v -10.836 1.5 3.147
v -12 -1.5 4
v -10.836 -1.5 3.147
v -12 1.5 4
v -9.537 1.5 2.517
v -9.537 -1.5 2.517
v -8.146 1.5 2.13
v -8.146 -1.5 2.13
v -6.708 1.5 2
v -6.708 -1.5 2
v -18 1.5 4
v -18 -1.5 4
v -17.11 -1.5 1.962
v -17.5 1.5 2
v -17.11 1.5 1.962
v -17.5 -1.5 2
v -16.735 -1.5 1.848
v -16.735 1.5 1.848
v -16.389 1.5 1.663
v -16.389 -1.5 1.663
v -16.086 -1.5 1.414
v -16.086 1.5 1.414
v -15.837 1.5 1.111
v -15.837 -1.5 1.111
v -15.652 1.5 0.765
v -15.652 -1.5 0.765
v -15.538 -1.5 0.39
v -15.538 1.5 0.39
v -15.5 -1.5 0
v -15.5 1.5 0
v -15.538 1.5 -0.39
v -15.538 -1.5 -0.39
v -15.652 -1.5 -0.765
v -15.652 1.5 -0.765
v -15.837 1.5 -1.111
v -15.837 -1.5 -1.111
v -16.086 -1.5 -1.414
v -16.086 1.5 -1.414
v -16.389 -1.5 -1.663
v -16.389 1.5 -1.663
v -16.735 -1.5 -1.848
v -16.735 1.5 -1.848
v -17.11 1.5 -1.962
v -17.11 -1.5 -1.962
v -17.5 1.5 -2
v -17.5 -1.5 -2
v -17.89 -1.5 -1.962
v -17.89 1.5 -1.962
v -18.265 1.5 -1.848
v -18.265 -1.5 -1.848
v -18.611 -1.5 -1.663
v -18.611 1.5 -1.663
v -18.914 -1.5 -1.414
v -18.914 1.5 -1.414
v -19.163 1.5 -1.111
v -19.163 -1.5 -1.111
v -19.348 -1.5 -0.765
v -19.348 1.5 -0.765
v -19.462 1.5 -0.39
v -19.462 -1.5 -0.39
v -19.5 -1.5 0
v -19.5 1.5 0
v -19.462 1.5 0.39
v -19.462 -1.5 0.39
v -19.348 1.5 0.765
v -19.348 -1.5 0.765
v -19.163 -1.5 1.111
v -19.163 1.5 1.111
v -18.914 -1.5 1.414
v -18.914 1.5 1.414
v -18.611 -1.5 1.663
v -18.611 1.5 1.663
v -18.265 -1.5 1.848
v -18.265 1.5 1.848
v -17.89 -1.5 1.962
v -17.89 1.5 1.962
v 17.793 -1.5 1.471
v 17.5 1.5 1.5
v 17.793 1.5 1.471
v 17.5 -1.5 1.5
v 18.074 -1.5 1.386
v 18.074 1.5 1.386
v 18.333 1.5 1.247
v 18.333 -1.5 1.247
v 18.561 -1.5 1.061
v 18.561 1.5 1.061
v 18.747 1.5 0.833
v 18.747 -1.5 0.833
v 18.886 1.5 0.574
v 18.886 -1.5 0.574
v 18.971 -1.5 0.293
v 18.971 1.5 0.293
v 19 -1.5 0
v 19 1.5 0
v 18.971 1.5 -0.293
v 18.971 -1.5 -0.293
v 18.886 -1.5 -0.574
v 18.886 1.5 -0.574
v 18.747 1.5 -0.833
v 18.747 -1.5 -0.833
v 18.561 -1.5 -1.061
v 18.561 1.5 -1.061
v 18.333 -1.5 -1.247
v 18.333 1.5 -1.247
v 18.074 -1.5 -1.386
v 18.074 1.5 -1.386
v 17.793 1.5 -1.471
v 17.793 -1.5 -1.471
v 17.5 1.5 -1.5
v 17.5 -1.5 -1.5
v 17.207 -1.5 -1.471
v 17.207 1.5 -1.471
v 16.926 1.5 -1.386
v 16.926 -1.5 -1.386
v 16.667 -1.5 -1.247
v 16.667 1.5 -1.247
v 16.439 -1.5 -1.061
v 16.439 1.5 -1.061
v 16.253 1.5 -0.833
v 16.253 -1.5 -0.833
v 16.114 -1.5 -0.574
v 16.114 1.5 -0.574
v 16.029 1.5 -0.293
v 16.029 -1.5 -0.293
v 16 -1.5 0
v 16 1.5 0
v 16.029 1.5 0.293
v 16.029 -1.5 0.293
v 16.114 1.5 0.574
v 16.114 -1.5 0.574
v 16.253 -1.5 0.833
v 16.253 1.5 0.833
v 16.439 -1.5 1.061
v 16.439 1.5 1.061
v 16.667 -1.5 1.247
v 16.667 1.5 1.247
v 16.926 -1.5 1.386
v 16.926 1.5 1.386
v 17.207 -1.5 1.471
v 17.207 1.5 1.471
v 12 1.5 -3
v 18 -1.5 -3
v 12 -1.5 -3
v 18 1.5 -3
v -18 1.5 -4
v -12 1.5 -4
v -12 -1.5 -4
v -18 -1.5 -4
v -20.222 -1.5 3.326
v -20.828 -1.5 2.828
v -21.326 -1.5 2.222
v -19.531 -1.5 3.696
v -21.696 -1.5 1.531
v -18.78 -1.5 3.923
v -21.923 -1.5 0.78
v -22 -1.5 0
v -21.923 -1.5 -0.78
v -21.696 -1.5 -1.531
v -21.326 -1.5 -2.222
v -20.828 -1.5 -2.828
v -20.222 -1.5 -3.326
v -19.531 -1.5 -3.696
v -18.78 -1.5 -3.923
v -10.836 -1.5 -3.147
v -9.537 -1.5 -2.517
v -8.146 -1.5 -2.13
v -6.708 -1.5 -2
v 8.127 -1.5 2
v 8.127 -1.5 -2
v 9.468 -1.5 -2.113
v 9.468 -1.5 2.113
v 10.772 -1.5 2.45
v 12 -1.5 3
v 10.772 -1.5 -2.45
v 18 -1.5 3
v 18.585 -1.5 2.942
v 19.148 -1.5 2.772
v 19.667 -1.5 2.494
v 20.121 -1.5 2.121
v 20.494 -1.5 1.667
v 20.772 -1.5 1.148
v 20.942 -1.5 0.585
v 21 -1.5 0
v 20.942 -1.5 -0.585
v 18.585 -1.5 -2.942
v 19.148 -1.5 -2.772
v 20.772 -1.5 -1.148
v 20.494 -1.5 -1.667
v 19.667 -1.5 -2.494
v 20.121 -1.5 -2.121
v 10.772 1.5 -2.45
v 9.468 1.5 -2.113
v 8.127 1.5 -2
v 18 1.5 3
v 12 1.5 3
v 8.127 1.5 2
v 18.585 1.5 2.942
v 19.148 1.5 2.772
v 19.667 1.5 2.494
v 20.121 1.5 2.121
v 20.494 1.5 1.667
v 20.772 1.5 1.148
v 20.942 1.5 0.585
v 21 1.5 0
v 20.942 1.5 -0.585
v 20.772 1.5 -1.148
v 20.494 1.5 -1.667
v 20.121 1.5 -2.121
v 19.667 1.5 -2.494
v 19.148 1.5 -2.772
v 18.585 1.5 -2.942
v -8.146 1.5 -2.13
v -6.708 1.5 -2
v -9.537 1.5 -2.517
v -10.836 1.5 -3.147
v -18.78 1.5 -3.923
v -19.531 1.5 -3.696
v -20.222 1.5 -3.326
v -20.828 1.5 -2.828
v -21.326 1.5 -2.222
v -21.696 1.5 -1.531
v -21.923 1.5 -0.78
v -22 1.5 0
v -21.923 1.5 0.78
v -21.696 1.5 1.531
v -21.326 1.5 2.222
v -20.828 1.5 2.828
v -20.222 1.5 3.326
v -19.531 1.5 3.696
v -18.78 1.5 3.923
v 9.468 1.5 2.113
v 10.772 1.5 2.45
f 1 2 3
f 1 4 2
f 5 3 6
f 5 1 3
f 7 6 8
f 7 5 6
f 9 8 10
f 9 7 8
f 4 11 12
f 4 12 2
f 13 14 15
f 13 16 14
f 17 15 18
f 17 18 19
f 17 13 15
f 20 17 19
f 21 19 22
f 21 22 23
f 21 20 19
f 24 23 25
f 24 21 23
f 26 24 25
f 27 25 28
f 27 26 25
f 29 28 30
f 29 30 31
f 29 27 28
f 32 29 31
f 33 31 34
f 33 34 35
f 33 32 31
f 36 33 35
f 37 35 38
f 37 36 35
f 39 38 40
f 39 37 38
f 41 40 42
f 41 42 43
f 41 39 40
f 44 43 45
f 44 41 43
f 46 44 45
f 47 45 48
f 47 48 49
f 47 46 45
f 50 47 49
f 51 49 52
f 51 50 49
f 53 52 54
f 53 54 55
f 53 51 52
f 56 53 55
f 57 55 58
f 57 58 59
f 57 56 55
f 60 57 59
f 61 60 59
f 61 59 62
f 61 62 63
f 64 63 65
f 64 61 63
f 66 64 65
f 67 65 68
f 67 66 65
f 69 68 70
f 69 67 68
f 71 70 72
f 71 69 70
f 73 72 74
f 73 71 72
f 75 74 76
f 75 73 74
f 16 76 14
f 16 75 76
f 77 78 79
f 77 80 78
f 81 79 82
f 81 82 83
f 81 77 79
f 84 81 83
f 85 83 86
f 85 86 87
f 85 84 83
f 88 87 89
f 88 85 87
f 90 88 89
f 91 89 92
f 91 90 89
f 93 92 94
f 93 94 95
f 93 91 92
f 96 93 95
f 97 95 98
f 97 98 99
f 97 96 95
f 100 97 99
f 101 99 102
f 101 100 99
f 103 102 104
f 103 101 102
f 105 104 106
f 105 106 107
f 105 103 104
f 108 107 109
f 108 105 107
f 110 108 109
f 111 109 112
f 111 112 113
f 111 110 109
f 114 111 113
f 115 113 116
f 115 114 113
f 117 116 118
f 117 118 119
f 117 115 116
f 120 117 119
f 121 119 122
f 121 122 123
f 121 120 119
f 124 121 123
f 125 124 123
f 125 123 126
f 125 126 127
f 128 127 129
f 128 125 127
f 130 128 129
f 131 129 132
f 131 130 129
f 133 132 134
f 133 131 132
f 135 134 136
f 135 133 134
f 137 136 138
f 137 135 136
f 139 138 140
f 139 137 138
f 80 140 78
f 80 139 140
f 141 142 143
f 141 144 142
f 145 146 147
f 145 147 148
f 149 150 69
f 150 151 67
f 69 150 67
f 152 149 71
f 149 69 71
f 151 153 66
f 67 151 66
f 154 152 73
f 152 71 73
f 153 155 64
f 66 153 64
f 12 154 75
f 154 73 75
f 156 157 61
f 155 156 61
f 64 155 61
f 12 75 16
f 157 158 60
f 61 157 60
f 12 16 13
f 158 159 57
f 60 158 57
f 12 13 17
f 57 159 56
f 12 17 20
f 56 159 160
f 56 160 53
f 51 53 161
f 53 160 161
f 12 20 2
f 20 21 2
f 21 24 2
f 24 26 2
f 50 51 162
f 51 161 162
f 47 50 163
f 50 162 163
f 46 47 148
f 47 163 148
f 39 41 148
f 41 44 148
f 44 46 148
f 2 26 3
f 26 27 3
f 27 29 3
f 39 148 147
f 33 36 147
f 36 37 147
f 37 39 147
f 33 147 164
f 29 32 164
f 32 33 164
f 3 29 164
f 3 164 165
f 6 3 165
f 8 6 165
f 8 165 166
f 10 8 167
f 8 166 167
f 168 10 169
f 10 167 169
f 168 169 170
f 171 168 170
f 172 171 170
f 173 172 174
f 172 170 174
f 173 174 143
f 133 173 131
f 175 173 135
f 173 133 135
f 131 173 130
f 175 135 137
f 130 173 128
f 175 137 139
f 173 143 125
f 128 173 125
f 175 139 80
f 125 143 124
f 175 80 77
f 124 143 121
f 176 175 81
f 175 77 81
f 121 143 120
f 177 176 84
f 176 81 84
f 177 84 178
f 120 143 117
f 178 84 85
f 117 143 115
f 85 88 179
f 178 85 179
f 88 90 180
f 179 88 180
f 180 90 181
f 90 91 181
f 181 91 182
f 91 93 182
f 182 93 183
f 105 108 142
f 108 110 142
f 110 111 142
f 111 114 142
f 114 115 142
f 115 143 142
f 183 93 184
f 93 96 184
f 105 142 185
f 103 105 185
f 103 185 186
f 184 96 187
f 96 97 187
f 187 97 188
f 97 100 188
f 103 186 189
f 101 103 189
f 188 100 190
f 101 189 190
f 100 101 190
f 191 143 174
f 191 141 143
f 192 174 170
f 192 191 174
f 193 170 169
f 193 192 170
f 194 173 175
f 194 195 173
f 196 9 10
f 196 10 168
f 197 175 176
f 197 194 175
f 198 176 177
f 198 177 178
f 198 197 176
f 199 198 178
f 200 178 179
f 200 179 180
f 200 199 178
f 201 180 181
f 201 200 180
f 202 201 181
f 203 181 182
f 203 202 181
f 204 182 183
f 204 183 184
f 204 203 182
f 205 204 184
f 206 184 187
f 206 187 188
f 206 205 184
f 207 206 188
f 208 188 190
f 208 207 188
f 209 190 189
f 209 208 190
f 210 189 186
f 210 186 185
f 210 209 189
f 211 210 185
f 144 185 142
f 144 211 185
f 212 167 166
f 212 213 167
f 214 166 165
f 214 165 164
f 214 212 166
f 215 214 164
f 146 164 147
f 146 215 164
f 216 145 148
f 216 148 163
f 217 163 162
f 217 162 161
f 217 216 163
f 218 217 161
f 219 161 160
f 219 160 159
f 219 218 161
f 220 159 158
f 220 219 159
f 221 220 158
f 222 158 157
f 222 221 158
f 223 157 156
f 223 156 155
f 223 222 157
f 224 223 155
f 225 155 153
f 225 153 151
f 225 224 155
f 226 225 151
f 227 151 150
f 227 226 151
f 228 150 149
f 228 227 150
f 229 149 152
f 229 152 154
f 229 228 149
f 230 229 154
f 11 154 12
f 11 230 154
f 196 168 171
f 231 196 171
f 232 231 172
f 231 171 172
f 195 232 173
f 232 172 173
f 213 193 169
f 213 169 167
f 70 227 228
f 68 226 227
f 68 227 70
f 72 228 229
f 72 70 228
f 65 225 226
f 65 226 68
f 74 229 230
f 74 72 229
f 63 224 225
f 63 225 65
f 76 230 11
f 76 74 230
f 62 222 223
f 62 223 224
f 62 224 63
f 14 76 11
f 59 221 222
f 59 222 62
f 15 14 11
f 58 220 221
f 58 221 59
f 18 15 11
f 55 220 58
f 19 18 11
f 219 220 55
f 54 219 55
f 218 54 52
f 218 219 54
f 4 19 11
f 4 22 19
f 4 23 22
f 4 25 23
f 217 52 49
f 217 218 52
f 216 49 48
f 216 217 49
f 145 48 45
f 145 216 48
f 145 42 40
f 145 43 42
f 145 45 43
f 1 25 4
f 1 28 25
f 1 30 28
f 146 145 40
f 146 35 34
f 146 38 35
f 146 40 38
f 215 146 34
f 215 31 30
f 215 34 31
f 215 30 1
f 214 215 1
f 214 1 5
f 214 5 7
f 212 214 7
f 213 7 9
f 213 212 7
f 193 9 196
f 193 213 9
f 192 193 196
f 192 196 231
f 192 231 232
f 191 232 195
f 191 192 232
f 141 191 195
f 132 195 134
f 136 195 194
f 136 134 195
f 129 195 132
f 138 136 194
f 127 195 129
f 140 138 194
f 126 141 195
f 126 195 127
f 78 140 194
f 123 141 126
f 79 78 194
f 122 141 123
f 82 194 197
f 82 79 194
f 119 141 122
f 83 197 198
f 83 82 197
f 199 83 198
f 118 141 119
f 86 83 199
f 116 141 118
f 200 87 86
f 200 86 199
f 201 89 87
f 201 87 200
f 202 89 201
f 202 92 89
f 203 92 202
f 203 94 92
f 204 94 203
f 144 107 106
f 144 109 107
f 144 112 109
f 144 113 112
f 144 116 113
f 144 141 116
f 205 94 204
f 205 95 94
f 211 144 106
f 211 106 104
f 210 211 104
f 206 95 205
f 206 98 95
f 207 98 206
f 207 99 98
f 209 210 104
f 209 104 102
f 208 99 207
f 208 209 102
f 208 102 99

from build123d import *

# Parameters (mm, degrees)
SKETCH1_R           = 2
SKETCH1_R_2         = 1.5
BOSS_EXTRUDE1_DEPTH = 1.5
BOSS_EXTRUDE2_DEPTH = 1.5


with BuildPart() as part:
    # Sketch1 → Boss-Extrude1 (new, symmetric)
    # profile 1 of 4: a face of its own
    with BuildSketch(Plane(origin=(0, 0, 0), x_dir=(1, 0, 0), z_dir=(0, 1, 0))):
        with BuildLine():
            Line((-12, 4), (-18, 4))
            ThreePointArc((-18, 4), (-22, 0), (-18, -4))
            Line((-18, -4), (-12, -4))
            Line((-12, -4), (-12, -2))
            Line((-12, -2), (12, -2))
            Line((12, -2), (12, -3))
            Line((12, -3), (18, -3))
            ThreePointArc((18, -3), (21, 0), (18, 3))
            Line((18, 3), (12, 3))
            Line((12, 3), (12, 2))
            Line((12, 2), (-12, 2))
            Line((-12, 2), (-12, 4))
        make_face()
        with Locations(Location((-17.5, 0, 0), (0, 0, 270))):
            Circle(SKETCH1_R, mode=Mode.SUBTRACT)
        with Locations(Location((17.5, 0, 0), (0, 0, 270))):
            Circle(SKETCH1_R_2, mode=Mode.SUBTRACT)
    # profile 2 of 4: a face of its own
    with BuildSketch(Plane(origin=(0, 0, 0), x_dir=(1, 0, 0), z_dir=(0, 1, 0))):
        with BuildLine():
            Line((12, -2), (8.127016654, -2))
            ThreePointArc((8.127016654, -2), (10.127016654, -2.254033308), (12, -3))
            Line((12, -3), (12, -2))
        make_face()
    # profile 3 of 4: a face of its own
    with BuildSketch(Plane(origin=(0, 0, 0), x_dir=(1, 0, 0), z_dir=(0, 1, 0))):
        with BuildLine():
            Line((-12, -2), (-12, -4))
            ThreePointArc((-12, -4), (-9.536924503, -2.516685226), (-6.708497378, -2))
            Line((-6.708497378, -2), (-12, -2))
        make_face()
    # profile 4 of 4: a face of its own
    with BuildSketch(Plane(origin=(0, 0, 0), x_dir=(1, 0, 0), z_dir=(0, 1, 0))):
        with BuildLine():
            Line((-12, 4), (-12, 2))
            Line((-12, 2), (-6.708497378, 2))
            ThreePointArc((-6.708497378, 2), (-9.536924503, 2.516685226), (-12, 4))
        make_face()
    extrude(amount=BOSS_EXTRUDE1_DEPTH, both=True)

    # Sketch2 → Boss-Extrude2 (add, symmetric)
    with BuildSketch(Plane(origin=(0, 0, 0), x_dir=(1, 0, 0), z_dir=(0, 1, 0))):
        with BuildLine():
            Line((8.127016654, 2), (12, 2))
            Line((12, 2), (12, 3))
            ThreePointArc((12, 3), (10.127016654, 2.254033308), (8.127016654, 2))
        make_face()
    extrude(amount=BOSS_EXTRUDE2_DEPTH, both=True)


solid = part.part
